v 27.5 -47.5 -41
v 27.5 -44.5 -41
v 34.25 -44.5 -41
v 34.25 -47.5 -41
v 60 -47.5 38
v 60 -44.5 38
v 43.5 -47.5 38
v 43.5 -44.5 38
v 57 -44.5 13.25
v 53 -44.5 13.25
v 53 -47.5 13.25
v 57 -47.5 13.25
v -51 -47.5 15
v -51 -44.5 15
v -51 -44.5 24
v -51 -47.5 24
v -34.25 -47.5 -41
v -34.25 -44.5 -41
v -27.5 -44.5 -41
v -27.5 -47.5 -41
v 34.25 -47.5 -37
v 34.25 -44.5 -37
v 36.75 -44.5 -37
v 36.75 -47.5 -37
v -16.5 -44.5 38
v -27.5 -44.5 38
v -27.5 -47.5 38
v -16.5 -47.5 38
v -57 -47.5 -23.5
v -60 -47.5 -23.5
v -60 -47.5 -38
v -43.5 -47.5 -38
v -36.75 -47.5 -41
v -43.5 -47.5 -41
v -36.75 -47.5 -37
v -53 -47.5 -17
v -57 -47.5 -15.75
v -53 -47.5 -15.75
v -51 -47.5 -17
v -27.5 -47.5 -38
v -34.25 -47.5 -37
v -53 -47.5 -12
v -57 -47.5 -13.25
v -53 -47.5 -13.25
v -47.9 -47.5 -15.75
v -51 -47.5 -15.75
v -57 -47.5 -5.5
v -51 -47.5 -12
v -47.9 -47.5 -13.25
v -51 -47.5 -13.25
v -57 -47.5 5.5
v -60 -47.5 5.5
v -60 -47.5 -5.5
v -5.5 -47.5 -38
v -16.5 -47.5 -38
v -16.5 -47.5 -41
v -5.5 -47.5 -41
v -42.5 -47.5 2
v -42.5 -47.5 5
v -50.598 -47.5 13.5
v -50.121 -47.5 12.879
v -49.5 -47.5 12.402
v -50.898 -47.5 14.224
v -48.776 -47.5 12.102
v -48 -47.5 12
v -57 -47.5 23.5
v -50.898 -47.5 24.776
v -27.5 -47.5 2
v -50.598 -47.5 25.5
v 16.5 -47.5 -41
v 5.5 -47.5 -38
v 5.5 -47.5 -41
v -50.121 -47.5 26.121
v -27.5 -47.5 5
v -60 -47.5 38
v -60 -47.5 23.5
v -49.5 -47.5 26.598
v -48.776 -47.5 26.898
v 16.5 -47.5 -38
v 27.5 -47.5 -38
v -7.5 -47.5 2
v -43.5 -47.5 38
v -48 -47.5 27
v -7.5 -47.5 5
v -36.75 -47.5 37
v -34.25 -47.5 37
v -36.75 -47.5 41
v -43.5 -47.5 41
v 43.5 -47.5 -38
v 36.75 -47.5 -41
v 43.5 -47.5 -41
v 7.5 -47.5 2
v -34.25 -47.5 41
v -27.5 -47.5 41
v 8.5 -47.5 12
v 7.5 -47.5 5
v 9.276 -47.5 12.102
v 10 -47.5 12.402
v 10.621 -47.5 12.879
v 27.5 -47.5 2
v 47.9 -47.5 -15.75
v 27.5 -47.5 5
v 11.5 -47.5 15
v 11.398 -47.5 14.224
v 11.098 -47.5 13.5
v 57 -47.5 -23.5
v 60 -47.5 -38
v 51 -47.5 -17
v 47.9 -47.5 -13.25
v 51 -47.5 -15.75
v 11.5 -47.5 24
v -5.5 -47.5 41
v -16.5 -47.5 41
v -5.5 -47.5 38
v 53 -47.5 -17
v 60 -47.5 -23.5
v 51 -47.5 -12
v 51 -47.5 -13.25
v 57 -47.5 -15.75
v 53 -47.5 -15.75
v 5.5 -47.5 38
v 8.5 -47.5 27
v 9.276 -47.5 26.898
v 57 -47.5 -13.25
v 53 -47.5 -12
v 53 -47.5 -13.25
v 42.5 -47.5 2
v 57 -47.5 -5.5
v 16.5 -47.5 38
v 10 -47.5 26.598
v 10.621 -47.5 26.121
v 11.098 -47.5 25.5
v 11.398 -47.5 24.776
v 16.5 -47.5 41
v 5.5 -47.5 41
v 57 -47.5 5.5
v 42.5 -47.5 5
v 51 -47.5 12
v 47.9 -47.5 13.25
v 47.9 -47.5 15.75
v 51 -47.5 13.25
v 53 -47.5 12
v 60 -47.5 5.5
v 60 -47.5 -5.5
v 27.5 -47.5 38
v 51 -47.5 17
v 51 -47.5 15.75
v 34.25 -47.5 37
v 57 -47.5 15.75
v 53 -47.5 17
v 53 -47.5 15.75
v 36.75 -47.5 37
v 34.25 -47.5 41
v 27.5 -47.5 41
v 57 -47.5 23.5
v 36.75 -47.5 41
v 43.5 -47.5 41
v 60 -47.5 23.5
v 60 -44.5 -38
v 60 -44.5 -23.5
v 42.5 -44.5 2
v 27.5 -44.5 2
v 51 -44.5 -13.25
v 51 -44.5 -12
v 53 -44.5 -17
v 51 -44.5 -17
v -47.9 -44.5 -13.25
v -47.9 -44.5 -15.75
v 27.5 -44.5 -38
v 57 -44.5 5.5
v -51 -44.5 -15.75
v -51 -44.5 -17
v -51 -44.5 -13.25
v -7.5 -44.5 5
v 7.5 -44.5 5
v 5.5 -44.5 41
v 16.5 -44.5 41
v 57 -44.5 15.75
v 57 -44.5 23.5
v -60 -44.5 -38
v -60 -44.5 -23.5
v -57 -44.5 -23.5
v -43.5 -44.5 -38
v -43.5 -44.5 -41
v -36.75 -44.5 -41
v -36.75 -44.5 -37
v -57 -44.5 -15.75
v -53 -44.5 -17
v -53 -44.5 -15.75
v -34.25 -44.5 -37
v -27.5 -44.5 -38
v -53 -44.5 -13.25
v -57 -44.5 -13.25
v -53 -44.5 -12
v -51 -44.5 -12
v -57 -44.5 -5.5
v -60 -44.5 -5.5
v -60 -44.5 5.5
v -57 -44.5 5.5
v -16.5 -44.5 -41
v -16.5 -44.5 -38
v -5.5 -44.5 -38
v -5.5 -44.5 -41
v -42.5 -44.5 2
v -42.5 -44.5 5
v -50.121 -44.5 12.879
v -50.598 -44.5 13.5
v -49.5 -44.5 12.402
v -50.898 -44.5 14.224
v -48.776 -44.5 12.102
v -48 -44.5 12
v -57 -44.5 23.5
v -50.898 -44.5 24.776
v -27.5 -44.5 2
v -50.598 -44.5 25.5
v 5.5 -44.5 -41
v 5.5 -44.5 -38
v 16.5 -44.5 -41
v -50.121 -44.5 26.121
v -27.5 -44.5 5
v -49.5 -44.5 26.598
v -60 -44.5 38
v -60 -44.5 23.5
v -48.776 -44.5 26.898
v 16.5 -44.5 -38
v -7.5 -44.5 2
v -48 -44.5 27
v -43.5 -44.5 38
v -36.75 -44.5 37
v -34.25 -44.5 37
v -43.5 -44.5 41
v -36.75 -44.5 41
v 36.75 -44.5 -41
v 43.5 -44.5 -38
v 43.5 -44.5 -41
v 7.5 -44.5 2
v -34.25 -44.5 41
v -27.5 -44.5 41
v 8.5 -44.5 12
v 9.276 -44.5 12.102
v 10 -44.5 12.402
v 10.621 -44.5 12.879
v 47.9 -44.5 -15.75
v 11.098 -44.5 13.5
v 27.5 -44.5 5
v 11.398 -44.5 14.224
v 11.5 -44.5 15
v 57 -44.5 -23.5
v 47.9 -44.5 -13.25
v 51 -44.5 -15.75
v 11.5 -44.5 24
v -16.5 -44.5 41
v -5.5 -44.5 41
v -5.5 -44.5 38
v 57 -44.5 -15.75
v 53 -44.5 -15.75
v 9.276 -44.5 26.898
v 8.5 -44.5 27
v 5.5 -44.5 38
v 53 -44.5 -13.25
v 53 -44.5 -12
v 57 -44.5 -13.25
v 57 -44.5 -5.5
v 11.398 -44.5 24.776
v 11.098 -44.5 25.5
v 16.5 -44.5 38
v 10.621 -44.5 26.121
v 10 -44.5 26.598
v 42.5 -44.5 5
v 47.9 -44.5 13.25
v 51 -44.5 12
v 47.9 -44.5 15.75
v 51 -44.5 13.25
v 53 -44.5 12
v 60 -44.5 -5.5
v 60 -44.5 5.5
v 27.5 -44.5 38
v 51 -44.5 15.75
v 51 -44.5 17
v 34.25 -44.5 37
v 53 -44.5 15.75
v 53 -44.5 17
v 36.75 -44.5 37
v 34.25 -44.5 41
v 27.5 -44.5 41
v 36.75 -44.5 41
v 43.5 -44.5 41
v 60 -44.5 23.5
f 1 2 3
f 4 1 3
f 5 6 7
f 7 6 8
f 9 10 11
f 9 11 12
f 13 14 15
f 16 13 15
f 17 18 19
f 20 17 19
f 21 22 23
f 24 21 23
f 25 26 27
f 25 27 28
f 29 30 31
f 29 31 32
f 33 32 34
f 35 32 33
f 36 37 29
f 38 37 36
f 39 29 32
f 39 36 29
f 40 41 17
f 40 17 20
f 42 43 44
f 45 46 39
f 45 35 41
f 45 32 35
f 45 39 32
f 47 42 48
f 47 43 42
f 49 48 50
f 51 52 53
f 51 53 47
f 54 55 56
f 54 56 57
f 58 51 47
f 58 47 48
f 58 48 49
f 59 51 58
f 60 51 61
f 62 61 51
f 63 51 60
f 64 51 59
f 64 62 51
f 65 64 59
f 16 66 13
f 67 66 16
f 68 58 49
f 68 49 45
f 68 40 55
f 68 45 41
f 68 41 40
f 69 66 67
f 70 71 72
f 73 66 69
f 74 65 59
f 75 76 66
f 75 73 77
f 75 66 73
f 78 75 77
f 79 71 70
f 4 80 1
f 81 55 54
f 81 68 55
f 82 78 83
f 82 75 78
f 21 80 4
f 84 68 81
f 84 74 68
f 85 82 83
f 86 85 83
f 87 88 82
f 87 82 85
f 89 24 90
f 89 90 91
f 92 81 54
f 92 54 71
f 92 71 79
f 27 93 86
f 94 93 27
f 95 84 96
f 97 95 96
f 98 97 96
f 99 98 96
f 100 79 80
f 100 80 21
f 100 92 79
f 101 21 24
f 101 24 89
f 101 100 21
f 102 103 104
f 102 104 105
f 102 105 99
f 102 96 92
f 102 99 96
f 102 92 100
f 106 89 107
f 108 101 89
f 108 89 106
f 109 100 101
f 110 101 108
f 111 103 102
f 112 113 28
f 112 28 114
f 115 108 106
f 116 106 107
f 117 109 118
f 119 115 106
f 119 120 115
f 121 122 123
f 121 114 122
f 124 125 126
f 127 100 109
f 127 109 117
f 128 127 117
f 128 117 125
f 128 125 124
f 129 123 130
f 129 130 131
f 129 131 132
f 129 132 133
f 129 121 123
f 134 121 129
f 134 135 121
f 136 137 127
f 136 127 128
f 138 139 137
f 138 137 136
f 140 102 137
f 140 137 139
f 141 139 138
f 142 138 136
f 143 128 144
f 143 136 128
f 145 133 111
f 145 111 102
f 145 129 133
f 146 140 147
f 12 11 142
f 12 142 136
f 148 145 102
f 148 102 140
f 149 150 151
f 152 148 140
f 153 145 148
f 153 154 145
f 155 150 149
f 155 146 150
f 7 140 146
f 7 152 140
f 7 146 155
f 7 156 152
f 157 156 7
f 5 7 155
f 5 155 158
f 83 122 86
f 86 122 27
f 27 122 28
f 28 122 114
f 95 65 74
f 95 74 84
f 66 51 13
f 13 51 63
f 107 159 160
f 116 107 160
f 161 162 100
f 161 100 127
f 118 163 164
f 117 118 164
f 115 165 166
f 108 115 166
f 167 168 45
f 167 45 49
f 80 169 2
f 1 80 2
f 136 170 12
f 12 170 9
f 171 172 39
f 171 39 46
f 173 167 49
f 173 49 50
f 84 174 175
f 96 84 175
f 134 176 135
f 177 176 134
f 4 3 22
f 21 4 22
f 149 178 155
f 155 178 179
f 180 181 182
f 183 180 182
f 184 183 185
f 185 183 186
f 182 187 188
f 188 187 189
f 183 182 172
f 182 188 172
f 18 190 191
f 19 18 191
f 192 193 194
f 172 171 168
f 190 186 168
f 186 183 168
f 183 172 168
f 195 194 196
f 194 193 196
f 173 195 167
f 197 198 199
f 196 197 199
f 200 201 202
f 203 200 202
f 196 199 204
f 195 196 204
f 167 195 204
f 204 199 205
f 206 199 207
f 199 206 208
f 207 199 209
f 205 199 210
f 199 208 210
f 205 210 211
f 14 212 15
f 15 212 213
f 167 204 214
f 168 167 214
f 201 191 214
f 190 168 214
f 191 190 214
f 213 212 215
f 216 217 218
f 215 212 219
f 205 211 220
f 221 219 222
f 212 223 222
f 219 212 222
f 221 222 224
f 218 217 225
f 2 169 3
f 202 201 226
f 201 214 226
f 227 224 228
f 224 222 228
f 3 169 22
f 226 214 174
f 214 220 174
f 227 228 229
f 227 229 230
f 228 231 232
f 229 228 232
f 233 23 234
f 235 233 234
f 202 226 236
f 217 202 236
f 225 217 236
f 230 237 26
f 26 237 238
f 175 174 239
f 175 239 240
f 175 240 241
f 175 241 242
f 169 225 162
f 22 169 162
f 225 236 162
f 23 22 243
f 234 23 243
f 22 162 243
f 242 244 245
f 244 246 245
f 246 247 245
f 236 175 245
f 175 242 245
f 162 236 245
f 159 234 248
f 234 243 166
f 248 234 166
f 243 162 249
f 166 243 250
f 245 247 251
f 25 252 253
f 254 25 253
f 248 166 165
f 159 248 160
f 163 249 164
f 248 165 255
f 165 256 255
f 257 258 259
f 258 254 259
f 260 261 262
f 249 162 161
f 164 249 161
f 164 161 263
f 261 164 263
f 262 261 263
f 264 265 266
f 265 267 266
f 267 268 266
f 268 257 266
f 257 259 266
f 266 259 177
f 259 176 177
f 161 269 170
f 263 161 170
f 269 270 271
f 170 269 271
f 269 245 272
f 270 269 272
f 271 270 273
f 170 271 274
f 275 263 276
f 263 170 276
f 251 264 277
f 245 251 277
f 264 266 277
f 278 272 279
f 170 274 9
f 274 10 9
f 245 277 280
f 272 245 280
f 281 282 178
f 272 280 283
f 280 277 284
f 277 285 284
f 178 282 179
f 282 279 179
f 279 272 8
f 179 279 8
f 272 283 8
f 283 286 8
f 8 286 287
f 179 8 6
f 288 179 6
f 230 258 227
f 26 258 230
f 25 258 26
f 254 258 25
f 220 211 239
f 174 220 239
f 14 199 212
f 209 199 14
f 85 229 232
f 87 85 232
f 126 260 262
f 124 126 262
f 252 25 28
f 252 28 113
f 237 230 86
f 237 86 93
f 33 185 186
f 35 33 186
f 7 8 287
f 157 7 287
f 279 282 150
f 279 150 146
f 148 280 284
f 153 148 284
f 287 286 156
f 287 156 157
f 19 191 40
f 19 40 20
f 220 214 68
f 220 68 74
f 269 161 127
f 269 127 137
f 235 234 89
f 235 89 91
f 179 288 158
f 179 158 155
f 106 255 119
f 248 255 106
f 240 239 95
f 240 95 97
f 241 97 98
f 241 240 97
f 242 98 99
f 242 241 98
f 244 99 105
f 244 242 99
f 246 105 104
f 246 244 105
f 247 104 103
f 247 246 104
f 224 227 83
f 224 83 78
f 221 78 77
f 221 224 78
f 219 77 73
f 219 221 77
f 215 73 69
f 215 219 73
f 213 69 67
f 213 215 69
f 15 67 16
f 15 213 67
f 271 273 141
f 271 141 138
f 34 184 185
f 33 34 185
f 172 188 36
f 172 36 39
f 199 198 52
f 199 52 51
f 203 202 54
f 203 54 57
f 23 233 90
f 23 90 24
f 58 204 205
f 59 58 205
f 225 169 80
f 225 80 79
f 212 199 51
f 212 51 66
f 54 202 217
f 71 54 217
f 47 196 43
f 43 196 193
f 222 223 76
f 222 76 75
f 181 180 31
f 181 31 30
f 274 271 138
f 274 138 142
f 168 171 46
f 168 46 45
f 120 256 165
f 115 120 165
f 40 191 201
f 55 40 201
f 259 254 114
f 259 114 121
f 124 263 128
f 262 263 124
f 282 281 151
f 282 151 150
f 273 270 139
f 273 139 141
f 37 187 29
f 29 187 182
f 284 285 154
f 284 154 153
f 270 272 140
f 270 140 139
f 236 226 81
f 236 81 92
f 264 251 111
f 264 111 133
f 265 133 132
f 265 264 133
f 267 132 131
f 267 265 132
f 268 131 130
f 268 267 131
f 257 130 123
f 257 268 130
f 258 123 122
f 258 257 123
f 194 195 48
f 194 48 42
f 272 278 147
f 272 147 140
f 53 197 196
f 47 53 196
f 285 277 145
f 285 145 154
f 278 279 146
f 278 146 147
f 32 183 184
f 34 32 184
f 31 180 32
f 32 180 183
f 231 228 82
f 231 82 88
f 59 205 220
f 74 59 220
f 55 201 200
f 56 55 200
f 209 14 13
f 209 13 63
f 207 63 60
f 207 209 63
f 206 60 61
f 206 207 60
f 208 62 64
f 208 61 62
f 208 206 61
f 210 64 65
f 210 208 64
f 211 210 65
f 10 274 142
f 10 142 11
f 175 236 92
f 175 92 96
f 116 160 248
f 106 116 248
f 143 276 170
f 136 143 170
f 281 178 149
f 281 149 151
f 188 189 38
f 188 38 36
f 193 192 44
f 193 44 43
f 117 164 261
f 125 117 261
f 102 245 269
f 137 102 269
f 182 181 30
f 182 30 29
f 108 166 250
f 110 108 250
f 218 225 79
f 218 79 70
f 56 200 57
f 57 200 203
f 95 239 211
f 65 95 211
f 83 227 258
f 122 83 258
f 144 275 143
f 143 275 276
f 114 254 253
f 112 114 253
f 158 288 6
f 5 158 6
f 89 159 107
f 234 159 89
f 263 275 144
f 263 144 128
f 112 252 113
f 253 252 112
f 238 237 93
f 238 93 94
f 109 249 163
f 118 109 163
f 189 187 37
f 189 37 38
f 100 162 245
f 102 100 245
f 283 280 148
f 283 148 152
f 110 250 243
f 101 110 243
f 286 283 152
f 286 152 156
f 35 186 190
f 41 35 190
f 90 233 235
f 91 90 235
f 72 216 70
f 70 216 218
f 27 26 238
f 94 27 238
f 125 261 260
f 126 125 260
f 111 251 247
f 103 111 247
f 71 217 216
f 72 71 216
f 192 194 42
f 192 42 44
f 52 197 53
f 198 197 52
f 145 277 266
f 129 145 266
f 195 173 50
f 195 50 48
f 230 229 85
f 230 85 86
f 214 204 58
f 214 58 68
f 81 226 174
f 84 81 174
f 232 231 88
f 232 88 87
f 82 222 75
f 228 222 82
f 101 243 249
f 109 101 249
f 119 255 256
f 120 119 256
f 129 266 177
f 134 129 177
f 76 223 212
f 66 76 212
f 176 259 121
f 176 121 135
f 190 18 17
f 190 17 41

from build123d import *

# Parameters (mm, degrees)
SKETCH009_W                   = 120
SKETCH009_H                   = 82
PAD002_DEPTH                  = 3
SKETCH010_W                   = 16.5
SKETCH010_H                   = 3
SKETCH010_W_2                 = 11
SKETCH010_W_3                 = 3
SKETCH010_H_2                 = 18
POCKET006_DEPTH               = 293.744874
SKETCH010_MIRRORED010_2_W     = 16.5
SKETCH010_MIRRORED010_2_H     = 3
SKETCH010_MIRRORED010_2_W_2   = 11
SKETCH010_MIRRORED010_2_W_3   = 3
SKETCH010_MIRRORED010_2_H_2   = 18
POCKET006_MIRRORED010_2_DEPTH = 293.744874
SKETCH011_W                   = 15
SKETCH011_H                   = 3
POCKET007_DEPTH               = 3.001
POCKET008_DEPTH               = 3.001
SKETCH013_W                   = 2.5
SKETCH013_H                   = 4
POCKET009_DEPTH               = 3.001


with BuildPart() as part:
    # Sketch009 → Pad002 (new body)
    with BuildSketch(Plane.XZ):
        Rectangle(SKETCH009_W, SKETCH009_H)
    extrude(amount=PAD002_DEPTH)

    # Sketch010 → Pocket006 (cut, through all)
    with BuildSketch(Plane.XZ):
        with Locations((-51.75, 39.5)):
            Rectangle(SKETCH010_W, SKETCH010_H)
        with Locations((-22, 39.5)):
            Rectangle(SKETCH010_W_2, SKETCH010_H)
        with Locations((0, 39.5)):
            Rectangle(SKETCH010_W_2, SKETCH010_H)
        with Locations((-58.5, 14.5)):
            Rectangle(SKETCH010_W_3, SKETCH010_H_2)
    pocket006 = extrude(amount=POCKET006_DEPTH, mode=Mode.SUBTRACT)

    # Sketch010 Mirrored010 2 → Pocket006 Mirrored010 2 (cut, through all)
    with BuildSketch(Plane(origin=(0, 0, 0), x_dir=(-1, 0, 0), z_dir=(0, 1, 0))):
        with Locations((-51.75, 39.5)):
            Rectangle(SKETCH010_MIRRORED010_2_W, SKETCH010_MIRRORED010_2_H)
        with Locations((-22, 39.5)):
            Rectangle(SKETCH010_MIRRORED010_2_W_2, SKETCH010_MIRRORED010_2_H)
        with Locations((0, 39.5)):
            Rectangle(SKETCH010_MIRRORED010_2_W_2, SKETCH010_MIRRORED010_2_H)
        with Locations((-58.5, 14.5)):
            Rectangle(SKETCH010_MIRRORED010_2_W_3, SKETCH010_MIRRORED010_2_H_2)
    pocket006_mirrored010_2 = extrude(amount=-POCKET006_MIRRORED010_2_DEPTH, mode=Mode.SUBTRACT)

    # Mirrored011: Pocket006, Pocket006 Mirrored010 2 across Sketch010 H_Axis
    add(pocket006.mirror(Plane(origin=(0, 0, 0), x_dir=(0, -1, 0), z_dir=(0, 0, 1))), mode=Mode.SUBTRACT)
    add(pocket006_mirrored010_2.mirror(Plane(origin=(0, 0, 0), x_dir=(0, -1, 0), z_dir=(0, 0, 1))), mode=Mode.SUBTRACT)

    # Sketch011 → Pocket007 (cut, through all)
    with BuildSketch(Plane.XZ):
        with Locations((35, 3.5)):
            Rectangle(SKETCH011_W, SKETCH011_H)
        with Locations((0, 3.5)):
            Rectangle(SKETCH011_W, SKETCH011_H)
        with Locations((-35, 3.5)):
            Rectangle(SKETCH011_W, SKETCH011_H)
    extrude(amount=POCKET007_DEPTH, mode=Mode.SUBTRACT)

    # Sketch012 → Pocket008 (cut, through all)
    with BuildSketch(Plane.XZ):
        with BuildLine():
            Line((-48, 27), (8.5, 27))
            ThreePointArc((11.5, 24), (10.62132, 26.12132), (8.5, 27))
            Line((11.5, 24), (11.5, 15))
            ThreePointArc((8.5, 12), (10.62132, 12.87868), (11.5, 15))
            Line((8.5, 12), (-48, 12))
            ThreePointArc((-51, 15), (-50.12132, 12.87868), (-48, 12))
            Line((-51, 15), (-51, 24))
            ThreePointArc((-48, 27), (-50.12132, 26.12132), (-51, 24))
        make_face()
    extrude(amount=POCKET008_DEPTH, mode=Mode.SUBTRACT)

    # Sketch013 → Pocket009 (cut, through all)
    with BuildSketch(Plane.XZ):
        Polygon((60, 15.75), (53, 15.75), (53, 17), (51, 17), (51, 15.75), (47.9, 15.75), (47.9, 13.25), (51, 13.25), (51, 12), (53, 12), (53, 13.25), (60, 13.25), align=None)
        with Locations((35.5, 39)):
            Rectangle(SKETCH013_W, SKETCH013_H)
        with Locations((-35.5, 39)):
            Rectangle(SKETCH013_W, SKETCH013_H)
        with Locations((35.5, -39)):
            Rectangle(SKETCH013_W, SKETCH013_H)
        with Locations((-35.5, -39)):
            Rectangle(SKETCH013_W, SKETCH013_H)
        Polygon((60, -15.75), (53, -15.75), (53, -17), (51, -17), (51, -15.75), (47.9, -15.75), (47.9, -13.25), (51, -13.25), (51, -12), (53, -12), (53, -13.25), (60, -13.25), align=None)
        Polygon((-60, -15.75), (-53, -15.75), (-53, -17), (-51, -17), (-51, -15.75), (-47.9, -15.75), (-47.9, -13.25), (-51, -13.25), (-51, -12), (-53, -12), (-53, -13.25), (-60, -13.25), align=None)
    extrude(amount=POCKET009_DEPTH, mode=Mode.SUBTRACT)


with BuildPart() as part_1:
    # Body003 placement: moved
    add(part.part.moved(Location((0, -44.5, 0))))


solid = part_1.part
